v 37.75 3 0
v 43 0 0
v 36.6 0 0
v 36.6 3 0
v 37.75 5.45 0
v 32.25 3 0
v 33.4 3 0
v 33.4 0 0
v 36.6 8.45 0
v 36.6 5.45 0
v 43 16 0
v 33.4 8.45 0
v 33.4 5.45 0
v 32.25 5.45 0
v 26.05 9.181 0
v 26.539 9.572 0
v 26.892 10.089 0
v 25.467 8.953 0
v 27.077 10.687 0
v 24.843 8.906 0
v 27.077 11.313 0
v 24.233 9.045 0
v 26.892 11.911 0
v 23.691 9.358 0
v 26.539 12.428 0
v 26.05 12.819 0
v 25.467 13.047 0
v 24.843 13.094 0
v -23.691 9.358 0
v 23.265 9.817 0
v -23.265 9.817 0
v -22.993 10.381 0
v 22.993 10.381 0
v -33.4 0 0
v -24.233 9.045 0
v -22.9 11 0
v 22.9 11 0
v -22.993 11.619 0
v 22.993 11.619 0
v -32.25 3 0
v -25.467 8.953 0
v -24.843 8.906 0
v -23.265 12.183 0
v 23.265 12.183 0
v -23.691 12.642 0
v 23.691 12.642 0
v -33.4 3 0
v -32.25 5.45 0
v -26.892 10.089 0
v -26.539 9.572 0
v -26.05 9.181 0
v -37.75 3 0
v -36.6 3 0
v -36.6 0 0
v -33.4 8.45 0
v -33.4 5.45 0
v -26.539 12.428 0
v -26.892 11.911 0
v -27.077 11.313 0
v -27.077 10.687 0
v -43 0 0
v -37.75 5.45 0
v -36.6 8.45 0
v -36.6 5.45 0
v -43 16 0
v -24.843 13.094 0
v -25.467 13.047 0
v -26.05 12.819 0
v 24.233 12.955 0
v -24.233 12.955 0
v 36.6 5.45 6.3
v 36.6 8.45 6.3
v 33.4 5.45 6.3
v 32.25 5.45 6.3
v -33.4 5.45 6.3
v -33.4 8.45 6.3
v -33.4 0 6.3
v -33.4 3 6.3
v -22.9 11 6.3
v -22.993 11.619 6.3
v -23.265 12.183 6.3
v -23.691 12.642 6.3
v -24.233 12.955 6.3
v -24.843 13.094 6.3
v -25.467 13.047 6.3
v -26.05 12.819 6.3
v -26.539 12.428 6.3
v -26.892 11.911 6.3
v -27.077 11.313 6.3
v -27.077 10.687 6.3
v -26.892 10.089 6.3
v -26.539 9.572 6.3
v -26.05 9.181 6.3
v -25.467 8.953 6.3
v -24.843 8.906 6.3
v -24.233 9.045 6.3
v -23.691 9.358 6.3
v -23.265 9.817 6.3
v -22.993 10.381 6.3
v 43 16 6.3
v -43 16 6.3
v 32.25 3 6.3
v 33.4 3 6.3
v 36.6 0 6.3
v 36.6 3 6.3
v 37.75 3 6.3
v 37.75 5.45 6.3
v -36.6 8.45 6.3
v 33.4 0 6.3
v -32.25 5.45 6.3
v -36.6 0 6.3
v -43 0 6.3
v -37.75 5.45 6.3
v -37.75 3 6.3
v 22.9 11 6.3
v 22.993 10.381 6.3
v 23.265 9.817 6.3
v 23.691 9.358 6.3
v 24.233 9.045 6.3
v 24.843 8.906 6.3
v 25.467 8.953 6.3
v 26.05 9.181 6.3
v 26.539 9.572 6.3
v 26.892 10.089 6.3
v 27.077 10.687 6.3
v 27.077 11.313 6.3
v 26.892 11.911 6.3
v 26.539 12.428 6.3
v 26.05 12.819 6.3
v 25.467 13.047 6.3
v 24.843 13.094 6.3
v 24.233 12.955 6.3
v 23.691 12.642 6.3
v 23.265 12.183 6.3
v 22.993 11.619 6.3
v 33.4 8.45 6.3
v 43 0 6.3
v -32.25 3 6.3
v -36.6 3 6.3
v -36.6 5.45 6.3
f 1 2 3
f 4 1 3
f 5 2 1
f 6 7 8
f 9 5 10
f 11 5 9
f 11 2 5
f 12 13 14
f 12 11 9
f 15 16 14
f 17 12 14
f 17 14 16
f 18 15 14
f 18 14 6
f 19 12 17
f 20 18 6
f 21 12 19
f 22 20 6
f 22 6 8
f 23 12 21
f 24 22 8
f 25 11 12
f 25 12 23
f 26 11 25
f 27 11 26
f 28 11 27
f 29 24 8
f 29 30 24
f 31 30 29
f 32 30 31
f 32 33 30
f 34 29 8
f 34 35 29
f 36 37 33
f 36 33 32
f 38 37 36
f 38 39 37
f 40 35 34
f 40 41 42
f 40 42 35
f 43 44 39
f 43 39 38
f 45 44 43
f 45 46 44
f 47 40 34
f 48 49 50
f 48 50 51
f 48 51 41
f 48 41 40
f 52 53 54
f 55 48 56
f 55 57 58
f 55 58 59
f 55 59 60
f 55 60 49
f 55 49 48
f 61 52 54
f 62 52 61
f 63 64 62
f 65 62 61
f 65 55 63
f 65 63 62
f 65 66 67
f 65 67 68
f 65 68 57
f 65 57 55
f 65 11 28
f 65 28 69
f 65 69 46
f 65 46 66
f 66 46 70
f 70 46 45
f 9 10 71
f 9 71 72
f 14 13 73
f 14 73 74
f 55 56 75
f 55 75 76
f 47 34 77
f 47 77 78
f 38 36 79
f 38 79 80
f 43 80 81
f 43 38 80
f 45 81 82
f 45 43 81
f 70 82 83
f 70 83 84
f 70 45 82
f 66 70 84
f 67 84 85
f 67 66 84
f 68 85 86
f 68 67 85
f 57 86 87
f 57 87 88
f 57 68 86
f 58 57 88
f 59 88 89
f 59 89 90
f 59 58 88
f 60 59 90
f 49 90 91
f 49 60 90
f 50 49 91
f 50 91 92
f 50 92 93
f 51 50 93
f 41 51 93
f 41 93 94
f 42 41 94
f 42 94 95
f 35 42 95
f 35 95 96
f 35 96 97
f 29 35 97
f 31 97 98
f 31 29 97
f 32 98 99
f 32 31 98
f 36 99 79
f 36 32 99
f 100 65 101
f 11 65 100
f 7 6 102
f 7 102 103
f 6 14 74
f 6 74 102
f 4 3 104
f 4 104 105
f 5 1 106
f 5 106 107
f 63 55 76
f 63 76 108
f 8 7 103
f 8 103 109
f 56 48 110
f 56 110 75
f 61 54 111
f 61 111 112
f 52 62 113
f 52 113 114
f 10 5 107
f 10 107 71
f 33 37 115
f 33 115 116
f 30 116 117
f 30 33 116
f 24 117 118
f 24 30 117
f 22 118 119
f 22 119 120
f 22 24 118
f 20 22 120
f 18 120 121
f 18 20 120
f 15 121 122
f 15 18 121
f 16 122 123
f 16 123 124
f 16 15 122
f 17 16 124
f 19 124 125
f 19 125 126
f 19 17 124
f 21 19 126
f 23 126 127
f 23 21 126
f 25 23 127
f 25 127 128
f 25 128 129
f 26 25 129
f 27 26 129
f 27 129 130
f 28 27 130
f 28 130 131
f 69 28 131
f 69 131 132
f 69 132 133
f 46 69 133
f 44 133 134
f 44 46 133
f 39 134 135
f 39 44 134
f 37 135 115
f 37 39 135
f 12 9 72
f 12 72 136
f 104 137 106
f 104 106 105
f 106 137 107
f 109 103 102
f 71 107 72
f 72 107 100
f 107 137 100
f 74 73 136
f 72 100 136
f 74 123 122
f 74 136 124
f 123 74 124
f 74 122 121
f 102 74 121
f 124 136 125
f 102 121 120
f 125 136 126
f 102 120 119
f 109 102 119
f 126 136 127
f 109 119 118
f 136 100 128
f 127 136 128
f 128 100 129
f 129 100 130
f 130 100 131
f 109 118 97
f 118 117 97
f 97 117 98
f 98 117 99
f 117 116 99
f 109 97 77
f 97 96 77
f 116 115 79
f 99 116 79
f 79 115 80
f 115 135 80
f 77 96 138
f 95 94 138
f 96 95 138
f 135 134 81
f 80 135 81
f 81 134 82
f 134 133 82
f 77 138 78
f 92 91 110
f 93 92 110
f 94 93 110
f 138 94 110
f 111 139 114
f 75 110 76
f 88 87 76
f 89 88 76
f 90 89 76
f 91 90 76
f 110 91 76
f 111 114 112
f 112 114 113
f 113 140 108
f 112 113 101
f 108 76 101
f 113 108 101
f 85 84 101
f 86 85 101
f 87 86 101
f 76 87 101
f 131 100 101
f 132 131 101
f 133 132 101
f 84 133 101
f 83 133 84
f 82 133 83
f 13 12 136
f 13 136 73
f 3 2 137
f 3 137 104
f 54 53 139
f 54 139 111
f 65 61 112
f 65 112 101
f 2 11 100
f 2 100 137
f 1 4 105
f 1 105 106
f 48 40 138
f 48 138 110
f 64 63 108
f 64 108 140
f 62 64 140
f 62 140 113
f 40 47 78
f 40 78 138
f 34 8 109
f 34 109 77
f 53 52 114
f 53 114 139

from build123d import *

# Parameters (mm, degrees)
SKETCH1_R           = 2.1
BOSS_EXTRUDE1_DEPTH = 6.3


with BuildPart() as part:
    # Sketch1 → Boss-Extrude1 (new body)
    with BuildSketch(Plane.XY):
        Polygon((33.4, 0), (-33.4, 0), (-33.4, 3), (-32.25, 3), (-32.25, 5.45), (-33.4, 5.45), (-33.4, 8.45), (-36.6, 8.45), (-36.6, 5.45), (-37.75, 5.45), (-37.75, 3), (-36.6, 3), (-36.6, 0), (-43, 0), (-43, 16), (43, 16), (43, 0), (36.6, 0), (36.6, 3), (37.75, 3), (37.75, 5.45), (36.6, 5.45), (36.6, 8.45), (33.4, 8.45), (33.4, 5.45), (32.25, 5.45), (32.25, 3), (33.4, 3), align=None)
        with Locations((-25, 11)):
            Circle(SKETCH1_R, mode=Mode.SUBTRACT)
        with Locations(Location((25, 11, 0), (0, 0, 180))):
            Circle(SKETCH1_R, mode=Mode.SUBTRACT)
    extrude(amount=BOSS_EXTRUDE1_DEPTH)


solid = part.part
